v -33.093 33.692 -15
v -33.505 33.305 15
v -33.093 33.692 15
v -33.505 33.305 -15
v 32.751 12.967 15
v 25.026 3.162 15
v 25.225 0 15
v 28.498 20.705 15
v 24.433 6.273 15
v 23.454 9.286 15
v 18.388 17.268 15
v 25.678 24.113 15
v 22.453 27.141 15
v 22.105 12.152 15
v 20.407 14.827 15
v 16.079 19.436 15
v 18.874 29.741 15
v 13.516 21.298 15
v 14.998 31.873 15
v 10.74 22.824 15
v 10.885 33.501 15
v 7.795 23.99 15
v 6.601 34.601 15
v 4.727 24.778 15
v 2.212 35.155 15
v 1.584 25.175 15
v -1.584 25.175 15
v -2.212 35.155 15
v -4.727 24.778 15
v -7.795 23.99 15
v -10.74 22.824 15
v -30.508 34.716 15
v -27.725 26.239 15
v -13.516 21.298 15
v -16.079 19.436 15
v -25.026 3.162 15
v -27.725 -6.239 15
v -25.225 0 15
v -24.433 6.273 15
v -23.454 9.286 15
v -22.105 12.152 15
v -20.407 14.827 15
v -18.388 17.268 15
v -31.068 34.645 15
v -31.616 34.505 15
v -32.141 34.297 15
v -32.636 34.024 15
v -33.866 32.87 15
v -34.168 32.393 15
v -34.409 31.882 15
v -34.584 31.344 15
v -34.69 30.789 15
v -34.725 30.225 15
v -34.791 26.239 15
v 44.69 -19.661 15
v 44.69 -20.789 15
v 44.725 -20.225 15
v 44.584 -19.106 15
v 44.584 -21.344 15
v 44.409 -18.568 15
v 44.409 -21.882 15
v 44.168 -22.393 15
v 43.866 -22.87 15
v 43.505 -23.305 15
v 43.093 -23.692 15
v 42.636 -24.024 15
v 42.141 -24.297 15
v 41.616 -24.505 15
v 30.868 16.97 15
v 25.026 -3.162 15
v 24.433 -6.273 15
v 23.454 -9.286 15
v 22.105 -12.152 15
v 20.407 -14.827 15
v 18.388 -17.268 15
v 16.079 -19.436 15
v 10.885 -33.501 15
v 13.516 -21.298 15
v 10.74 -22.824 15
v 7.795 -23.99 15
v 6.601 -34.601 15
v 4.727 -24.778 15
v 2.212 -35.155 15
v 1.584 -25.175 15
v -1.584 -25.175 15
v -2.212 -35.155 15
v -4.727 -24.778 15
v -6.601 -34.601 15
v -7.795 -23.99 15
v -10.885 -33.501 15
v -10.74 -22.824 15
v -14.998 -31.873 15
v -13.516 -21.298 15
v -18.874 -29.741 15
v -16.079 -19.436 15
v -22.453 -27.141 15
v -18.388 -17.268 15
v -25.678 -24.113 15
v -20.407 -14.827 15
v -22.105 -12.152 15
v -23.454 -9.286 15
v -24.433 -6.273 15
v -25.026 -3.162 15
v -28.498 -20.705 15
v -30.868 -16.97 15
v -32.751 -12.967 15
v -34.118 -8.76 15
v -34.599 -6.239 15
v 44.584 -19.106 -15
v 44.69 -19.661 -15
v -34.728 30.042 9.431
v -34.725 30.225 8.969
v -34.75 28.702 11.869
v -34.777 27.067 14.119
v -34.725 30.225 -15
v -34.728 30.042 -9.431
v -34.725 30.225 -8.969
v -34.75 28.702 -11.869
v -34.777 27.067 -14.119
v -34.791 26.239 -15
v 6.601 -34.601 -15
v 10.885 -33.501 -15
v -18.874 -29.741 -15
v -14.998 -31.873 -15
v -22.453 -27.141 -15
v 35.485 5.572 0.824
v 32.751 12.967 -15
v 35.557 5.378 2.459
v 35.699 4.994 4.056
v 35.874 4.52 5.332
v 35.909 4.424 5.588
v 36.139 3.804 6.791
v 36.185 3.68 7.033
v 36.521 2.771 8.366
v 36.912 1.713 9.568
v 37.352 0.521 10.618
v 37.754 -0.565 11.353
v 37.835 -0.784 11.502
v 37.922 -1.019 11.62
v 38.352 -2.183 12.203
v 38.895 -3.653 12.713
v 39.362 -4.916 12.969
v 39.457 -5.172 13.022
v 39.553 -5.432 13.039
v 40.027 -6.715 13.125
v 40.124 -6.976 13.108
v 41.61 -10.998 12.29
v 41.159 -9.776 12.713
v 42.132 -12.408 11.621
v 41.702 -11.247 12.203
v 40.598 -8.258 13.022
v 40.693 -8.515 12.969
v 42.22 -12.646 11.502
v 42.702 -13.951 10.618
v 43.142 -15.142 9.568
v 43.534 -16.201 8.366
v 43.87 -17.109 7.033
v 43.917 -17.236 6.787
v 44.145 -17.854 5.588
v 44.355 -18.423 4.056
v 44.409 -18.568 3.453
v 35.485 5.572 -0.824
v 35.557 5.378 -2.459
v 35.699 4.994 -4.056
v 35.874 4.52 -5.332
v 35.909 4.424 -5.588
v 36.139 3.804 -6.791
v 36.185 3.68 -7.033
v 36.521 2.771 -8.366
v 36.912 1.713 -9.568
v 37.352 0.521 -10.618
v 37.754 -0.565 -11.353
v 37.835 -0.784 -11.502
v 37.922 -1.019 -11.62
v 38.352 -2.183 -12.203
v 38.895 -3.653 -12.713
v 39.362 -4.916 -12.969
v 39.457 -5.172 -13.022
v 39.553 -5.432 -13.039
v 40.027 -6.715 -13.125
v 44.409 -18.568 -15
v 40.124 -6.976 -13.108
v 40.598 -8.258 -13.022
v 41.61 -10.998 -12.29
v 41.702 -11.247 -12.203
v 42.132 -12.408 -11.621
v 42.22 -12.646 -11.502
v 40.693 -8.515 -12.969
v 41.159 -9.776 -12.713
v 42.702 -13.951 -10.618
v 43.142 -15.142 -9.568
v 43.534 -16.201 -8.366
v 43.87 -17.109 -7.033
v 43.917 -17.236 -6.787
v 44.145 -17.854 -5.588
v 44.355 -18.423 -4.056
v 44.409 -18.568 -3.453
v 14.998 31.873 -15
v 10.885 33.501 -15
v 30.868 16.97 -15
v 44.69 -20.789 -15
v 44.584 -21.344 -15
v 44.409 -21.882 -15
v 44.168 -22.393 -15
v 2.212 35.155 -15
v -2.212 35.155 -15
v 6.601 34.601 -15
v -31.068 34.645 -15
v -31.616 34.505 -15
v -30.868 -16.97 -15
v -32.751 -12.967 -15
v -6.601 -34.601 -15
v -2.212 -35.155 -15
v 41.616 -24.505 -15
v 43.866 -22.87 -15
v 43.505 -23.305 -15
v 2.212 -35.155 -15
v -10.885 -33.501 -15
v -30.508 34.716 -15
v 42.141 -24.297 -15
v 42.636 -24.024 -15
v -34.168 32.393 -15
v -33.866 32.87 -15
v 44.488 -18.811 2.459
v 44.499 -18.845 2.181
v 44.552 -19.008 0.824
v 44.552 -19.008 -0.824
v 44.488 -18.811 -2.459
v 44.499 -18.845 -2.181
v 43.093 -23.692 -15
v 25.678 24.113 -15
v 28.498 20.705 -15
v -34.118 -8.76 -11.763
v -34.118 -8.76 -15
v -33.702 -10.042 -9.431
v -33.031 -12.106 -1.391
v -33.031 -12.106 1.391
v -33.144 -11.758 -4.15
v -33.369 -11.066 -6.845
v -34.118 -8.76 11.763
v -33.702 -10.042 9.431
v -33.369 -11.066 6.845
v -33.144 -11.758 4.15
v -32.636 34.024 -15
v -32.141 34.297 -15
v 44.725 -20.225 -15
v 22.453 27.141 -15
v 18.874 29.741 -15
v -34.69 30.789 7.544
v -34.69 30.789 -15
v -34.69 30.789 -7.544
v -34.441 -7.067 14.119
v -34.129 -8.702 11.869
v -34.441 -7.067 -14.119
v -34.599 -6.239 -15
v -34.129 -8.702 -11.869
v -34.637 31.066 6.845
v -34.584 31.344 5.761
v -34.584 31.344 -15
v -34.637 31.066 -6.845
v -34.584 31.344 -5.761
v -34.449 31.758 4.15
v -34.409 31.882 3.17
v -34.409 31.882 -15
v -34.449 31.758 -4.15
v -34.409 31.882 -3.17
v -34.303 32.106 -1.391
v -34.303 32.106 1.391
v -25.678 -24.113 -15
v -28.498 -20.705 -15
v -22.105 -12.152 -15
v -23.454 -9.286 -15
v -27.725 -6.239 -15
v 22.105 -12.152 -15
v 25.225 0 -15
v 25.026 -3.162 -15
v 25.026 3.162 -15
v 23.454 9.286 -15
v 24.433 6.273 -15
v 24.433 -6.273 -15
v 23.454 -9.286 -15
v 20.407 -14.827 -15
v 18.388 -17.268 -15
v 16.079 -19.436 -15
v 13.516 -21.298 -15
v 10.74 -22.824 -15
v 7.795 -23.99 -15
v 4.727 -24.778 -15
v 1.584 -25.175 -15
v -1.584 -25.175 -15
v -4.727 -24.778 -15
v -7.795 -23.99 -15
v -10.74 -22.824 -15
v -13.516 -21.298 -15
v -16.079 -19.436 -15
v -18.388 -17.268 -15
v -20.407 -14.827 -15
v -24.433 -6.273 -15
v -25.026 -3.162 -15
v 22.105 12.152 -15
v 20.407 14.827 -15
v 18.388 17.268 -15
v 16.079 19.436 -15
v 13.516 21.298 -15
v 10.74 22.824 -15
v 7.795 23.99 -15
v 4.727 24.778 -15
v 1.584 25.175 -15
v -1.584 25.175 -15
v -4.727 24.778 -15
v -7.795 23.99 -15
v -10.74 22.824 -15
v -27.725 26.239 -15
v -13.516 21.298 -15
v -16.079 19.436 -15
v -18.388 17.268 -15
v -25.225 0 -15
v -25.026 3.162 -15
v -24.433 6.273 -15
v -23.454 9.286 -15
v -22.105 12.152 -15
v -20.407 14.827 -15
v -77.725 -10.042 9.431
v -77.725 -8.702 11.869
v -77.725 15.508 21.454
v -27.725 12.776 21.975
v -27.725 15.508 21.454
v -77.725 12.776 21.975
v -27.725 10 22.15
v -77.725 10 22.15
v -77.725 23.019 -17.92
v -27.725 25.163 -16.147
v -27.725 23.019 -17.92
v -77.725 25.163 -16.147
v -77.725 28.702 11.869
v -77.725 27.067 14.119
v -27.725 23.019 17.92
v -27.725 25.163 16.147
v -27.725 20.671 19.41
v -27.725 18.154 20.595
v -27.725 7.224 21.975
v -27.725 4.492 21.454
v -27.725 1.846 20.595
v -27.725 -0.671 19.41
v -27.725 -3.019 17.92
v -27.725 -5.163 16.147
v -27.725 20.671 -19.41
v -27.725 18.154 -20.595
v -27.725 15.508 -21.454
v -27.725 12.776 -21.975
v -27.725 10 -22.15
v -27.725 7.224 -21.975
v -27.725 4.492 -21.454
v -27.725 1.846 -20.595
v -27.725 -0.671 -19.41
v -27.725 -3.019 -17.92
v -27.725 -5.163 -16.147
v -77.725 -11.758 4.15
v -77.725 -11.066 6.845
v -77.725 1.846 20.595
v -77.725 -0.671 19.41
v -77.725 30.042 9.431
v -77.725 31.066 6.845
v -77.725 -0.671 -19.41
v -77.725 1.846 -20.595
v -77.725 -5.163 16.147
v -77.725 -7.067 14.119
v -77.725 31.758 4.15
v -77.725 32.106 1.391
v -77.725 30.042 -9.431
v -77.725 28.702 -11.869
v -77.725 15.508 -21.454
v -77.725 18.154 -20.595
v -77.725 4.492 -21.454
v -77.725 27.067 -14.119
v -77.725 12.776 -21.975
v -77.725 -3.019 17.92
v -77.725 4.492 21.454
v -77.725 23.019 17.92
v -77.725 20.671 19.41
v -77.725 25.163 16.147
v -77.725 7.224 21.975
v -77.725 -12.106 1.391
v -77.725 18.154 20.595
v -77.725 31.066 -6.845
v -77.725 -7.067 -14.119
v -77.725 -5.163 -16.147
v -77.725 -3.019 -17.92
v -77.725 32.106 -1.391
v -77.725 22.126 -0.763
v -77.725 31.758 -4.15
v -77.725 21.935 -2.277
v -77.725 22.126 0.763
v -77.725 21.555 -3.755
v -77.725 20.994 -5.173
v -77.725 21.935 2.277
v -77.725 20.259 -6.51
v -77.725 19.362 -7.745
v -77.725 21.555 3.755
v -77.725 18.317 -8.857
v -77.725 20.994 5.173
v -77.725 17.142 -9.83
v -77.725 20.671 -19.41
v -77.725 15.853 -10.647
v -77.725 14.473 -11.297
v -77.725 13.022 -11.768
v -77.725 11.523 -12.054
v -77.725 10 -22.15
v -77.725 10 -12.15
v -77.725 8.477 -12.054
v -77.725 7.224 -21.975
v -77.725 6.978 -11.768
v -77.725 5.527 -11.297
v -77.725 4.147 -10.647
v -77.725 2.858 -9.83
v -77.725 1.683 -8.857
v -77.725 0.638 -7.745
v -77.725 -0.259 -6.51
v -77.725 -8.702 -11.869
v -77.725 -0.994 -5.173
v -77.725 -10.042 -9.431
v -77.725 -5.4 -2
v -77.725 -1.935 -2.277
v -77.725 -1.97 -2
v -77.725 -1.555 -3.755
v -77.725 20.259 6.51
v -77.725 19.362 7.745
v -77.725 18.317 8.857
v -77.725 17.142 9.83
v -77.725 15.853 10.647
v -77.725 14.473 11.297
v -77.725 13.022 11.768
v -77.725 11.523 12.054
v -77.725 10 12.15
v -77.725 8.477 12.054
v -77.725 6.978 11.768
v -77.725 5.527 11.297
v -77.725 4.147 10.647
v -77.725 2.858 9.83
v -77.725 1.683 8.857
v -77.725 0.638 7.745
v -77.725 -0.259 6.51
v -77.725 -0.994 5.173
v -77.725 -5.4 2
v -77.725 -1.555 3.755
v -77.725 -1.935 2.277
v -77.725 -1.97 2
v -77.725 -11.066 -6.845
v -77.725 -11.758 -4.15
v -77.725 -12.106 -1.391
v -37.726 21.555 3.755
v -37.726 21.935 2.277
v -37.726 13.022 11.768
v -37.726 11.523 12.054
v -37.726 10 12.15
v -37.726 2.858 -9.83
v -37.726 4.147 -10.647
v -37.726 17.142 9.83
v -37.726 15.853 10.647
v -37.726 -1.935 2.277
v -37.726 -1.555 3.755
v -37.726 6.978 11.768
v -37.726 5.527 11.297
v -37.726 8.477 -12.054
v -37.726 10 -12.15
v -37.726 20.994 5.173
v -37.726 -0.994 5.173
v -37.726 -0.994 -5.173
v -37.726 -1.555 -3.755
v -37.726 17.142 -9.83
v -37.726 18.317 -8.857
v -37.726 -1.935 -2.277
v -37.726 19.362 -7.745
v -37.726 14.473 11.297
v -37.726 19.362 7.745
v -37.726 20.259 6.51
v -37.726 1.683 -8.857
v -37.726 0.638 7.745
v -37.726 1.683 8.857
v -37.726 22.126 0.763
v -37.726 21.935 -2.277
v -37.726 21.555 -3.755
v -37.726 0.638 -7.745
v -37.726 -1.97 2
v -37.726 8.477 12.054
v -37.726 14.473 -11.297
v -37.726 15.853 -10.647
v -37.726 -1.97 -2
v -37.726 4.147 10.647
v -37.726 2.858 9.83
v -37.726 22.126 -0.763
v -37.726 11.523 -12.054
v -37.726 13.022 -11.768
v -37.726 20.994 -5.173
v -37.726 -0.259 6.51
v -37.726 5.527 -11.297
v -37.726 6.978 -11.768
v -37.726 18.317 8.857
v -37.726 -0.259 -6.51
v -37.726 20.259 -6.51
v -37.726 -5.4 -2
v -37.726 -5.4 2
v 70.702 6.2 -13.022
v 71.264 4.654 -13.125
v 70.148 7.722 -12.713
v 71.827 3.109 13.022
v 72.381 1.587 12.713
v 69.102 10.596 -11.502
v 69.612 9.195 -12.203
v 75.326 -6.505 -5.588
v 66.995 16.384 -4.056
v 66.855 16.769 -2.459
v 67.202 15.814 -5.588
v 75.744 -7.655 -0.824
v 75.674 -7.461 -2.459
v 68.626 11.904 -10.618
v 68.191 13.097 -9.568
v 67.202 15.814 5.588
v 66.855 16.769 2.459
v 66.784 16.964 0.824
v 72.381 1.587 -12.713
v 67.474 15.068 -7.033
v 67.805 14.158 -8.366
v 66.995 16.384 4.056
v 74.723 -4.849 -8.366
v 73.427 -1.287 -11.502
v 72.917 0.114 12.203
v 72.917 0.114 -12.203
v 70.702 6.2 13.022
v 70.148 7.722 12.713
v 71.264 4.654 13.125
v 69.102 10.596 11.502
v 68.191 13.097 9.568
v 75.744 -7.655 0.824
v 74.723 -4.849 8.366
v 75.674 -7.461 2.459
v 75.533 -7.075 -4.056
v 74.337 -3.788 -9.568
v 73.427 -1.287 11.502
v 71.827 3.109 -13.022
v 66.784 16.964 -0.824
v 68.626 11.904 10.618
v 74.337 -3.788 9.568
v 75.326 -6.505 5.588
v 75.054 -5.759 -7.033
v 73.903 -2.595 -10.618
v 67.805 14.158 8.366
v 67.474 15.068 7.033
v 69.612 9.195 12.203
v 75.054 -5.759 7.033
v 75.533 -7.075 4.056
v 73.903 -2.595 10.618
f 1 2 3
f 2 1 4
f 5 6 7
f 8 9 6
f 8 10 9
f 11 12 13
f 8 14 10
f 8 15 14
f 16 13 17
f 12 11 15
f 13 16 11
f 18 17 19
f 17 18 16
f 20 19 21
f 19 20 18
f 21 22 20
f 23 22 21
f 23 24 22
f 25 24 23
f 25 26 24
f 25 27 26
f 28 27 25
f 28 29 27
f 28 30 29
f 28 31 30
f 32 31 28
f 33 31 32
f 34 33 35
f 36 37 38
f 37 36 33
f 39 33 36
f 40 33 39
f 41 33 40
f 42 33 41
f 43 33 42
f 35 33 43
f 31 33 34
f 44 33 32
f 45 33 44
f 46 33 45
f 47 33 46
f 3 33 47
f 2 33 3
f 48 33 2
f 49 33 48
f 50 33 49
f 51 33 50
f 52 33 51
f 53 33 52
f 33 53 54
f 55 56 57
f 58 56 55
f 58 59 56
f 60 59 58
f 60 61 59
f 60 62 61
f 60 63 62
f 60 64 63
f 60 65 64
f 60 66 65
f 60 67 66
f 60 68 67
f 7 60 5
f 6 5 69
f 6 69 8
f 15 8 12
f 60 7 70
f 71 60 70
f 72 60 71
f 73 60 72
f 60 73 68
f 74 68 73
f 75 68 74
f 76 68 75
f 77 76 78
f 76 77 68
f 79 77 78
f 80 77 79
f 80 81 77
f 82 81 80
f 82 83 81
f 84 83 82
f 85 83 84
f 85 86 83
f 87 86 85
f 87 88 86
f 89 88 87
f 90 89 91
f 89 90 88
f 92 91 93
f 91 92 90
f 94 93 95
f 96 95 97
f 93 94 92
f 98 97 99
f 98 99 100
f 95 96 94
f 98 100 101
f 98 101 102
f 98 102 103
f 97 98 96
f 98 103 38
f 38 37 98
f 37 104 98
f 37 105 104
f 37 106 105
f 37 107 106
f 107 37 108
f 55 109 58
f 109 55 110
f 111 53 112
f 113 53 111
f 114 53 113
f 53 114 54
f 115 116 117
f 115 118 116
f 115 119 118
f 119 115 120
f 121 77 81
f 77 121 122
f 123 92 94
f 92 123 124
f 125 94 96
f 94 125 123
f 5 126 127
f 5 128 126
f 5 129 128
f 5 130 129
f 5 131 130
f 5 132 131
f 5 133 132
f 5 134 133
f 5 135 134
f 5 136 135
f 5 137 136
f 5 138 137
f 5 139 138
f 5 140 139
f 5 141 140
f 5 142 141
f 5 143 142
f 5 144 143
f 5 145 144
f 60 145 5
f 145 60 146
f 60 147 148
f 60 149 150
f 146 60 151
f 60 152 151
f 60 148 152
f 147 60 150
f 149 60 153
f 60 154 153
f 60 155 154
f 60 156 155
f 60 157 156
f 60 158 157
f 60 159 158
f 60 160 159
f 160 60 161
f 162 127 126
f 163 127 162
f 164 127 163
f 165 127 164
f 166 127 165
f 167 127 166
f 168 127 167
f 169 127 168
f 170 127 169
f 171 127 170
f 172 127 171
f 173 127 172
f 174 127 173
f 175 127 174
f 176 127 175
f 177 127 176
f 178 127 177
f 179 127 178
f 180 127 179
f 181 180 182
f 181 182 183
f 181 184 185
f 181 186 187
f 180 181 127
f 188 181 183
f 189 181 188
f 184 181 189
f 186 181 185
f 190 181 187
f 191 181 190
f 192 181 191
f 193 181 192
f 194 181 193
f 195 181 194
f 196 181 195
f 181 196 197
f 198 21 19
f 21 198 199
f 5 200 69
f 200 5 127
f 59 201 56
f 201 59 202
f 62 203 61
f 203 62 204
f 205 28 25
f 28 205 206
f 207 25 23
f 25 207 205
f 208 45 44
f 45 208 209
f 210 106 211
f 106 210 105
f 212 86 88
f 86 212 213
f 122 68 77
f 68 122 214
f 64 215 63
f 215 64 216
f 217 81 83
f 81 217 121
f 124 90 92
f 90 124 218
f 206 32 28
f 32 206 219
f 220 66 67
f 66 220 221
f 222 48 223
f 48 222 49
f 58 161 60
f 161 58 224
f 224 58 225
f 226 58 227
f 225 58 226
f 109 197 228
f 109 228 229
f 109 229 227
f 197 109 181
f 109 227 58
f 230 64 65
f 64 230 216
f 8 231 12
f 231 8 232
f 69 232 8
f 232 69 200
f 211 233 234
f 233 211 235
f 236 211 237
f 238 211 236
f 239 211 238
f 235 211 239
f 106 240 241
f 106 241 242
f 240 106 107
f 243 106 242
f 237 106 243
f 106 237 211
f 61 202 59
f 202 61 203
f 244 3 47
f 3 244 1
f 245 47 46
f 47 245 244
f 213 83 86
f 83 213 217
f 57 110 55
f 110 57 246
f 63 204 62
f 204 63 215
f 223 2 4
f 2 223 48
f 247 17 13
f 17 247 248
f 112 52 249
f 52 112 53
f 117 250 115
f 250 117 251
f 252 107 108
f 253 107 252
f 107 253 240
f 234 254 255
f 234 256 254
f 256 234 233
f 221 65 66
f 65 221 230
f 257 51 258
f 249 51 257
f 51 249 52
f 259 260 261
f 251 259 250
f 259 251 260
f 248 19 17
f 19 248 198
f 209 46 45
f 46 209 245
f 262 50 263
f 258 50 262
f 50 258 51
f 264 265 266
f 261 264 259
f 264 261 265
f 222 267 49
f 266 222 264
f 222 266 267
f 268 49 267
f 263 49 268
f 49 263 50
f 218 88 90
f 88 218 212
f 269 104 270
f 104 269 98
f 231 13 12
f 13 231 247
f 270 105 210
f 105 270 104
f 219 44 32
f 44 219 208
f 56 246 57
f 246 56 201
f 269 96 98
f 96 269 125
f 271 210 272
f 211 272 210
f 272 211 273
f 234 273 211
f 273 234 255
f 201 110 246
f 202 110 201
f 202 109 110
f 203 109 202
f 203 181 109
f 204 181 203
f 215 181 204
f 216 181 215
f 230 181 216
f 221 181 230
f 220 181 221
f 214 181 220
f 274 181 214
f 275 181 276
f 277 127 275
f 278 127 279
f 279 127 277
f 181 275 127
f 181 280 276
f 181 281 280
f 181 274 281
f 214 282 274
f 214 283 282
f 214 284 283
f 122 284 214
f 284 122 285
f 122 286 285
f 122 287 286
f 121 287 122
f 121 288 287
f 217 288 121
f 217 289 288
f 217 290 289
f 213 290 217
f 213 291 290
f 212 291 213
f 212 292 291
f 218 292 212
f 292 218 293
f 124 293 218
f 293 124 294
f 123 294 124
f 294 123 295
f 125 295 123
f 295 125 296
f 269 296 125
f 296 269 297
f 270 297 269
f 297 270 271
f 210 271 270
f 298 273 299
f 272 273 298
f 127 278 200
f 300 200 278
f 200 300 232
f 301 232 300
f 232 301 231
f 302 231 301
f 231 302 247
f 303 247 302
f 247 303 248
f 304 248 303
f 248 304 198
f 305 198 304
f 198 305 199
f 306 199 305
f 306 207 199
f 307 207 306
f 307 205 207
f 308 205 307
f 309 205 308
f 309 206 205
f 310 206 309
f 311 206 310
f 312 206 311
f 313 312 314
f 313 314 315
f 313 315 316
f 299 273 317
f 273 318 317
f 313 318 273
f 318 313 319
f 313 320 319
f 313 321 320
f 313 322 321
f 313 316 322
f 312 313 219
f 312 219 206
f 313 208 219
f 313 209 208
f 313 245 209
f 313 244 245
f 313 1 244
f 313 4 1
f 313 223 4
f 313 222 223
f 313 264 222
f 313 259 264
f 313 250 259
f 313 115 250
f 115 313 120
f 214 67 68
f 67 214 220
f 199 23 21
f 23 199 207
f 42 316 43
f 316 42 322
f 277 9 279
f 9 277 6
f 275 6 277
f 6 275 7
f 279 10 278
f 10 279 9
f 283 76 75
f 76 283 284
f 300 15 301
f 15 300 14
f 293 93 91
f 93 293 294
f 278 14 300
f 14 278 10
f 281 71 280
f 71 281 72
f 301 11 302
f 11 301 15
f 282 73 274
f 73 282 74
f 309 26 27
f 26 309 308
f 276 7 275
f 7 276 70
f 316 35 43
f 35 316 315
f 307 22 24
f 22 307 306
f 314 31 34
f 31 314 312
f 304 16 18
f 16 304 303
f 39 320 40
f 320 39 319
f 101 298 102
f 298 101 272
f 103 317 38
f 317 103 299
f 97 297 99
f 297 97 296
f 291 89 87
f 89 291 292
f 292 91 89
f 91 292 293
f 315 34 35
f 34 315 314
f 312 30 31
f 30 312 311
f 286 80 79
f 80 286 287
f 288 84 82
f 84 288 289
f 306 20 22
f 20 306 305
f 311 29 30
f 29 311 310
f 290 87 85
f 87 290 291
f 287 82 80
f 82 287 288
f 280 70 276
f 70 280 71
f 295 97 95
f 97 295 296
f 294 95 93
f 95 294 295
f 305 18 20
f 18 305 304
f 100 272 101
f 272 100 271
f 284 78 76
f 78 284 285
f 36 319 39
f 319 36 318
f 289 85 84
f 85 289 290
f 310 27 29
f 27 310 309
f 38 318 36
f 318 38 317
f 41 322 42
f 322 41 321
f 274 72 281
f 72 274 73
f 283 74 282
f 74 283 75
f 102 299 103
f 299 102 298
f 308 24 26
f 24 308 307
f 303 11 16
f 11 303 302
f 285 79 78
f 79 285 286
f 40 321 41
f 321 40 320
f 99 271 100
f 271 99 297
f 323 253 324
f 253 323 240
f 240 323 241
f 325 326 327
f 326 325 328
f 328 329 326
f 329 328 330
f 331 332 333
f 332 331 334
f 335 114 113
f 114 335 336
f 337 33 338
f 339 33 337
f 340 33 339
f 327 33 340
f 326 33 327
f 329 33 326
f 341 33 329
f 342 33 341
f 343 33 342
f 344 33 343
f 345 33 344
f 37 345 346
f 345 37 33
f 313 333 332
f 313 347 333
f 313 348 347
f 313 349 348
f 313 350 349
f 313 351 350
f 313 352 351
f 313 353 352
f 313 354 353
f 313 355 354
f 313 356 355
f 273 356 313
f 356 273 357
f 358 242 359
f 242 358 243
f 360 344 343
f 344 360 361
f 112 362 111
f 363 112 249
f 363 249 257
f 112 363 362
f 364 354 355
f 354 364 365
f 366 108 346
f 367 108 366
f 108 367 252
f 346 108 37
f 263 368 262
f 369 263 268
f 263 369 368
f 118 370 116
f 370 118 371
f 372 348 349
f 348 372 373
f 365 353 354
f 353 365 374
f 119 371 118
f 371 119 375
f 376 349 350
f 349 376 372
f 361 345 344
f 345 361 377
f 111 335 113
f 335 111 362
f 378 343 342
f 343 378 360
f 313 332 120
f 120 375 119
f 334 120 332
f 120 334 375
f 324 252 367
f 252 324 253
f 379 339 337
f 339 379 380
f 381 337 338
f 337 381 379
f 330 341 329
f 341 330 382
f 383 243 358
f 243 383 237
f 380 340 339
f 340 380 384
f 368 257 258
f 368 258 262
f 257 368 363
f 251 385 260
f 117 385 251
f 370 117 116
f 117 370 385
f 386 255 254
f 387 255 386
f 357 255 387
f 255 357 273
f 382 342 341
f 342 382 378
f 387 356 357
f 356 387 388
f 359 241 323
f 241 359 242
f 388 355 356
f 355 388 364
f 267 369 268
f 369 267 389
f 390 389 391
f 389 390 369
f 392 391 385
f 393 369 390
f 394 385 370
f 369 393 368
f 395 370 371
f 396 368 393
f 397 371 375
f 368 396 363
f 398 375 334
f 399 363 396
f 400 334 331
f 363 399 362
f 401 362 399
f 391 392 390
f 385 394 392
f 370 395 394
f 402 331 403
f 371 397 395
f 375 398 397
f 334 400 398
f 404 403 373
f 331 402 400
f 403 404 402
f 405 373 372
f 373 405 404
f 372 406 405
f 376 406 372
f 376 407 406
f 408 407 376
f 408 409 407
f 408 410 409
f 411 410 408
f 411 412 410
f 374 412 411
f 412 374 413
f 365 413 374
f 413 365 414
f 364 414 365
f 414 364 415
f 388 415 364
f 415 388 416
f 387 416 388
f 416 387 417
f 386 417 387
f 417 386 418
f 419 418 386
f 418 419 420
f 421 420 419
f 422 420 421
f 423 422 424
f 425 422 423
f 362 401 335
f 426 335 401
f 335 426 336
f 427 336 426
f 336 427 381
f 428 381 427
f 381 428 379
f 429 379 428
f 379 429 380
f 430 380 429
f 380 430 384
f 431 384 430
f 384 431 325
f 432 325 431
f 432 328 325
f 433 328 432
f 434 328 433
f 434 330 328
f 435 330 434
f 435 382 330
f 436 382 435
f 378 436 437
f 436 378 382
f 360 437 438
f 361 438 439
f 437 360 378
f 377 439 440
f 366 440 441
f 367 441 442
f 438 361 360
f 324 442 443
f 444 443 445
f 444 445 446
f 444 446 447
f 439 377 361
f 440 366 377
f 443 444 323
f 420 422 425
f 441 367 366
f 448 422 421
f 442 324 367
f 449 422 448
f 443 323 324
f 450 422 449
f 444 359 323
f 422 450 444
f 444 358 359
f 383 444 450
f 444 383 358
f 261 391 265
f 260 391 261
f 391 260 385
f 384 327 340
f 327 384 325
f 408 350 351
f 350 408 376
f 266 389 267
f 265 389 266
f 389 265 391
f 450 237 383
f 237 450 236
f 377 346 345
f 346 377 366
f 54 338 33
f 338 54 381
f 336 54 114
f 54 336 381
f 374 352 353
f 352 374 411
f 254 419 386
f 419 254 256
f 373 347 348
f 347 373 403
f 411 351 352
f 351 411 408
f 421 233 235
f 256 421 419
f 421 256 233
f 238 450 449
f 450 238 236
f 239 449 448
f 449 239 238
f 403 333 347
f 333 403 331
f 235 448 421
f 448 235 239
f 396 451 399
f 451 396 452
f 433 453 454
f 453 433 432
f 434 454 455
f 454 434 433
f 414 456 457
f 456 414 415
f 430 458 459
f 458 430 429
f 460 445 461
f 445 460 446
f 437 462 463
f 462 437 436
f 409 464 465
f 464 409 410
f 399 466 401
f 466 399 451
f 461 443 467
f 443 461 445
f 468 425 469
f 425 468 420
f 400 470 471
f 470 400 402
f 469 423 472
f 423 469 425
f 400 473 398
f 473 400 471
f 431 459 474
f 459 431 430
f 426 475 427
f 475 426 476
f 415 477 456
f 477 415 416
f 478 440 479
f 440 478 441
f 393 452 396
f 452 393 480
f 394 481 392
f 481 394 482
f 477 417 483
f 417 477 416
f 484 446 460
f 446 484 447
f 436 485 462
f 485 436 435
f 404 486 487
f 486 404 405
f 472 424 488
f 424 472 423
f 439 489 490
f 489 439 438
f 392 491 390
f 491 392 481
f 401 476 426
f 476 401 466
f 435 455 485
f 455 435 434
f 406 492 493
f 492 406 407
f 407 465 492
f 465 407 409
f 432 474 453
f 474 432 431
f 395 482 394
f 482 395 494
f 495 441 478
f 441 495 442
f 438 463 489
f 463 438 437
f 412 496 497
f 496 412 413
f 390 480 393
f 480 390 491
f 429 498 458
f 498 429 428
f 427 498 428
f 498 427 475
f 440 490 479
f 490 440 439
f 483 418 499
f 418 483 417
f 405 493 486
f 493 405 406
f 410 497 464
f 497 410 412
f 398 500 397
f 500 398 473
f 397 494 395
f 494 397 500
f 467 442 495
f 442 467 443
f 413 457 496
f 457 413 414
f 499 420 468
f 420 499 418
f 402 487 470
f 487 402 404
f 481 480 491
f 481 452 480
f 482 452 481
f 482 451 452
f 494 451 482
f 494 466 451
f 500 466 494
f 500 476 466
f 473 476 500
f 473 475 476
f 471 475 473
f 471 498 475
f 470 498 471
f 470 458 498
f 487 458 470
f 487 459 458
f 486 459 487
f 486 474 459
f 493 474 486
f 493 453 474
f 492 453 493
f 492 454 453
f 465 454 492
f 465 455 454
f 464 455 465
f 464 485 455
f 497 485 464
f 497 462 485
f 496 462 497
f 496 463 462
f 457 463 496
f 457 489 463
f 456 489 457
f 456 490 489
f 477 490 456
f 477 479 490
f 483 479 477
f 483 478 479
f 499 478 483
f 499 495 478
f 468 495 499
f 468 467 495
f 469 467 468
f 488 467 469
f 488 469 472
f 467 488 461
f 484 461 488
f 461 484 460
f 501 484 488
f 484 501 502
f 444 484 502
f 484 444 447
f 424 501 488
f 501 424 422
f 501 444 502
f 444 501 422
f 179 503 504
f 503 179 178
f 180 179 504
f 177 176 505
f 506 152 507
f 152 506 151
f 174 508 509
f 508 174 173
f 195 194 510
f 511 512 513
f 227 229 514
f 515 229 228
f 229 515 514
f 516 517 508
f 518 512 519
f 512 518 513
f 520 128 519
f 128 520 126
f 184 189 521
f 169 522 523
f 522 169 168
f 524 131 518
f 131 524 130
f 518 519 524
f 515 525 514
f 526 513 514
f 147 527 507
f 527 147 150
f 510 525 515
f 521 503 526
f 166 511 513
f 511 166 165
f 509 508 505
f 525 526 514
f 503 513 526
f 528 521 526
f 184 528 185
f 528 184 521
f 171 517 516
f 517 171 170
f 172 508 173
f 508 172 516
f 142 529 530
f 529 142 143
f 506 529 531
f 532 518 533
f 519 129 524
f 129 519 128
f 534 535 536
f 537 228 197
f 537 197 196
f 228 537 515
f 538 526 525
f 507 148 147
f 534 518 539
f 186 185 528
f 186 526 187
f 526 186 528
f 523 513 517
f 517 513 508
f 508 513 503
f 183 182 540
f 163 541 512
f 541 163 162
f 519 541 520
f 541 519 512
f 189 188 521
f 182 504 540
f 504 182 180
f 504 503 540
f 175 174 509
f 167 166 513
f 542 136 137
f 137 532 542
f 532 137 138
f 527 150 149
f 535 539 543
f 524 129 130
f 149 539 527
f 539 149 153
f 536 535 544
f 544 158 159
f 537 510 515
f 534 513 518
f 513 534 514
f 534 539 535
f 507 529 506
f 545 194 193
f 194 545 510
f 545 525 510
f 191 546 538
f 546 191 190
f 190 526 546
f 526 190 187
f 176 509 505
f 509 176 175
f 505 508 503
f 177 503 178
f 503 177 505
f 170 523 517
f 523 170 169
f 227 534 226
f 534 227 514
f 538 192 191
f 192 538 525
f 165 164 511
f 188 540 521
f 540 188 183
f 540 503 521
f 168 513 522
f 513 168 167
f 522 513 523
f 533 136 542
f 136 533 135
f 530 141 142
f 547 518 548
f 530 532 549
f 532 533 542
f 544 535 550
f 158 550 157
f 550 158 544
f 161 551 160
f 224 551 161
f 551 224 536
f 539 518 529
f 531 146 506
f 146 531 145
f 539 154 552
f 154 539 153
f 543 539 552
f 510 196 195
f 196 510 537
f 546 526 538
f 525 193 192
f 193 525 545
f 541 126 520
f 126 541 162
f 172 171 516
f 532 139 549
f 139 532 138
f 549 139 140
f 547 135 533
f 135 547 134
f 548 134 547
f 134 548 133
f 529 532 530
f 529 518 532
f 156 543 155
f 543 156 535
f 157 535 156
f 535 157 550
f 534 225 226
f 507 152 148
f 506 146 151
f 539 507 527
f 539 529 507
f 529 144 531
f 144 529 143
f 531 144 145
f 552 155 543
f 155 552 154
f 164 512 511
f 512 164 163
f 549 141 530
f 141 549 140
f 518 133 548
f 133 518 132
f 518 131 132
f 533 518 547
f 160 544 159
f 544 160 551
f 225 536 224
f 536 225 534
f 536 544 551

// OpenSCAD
pvc100PipeInnerDia=26.25;  // 1 inch
pvc100PipeOuterDia=33.5; // 1.32 inches

pvc125PipeInnerDia=31.75;  // 1.25 inches
pvc125PipeOuterDia=42.25; // 1.665 inches
pvc125FittingInnerDia=pvc125PipeOuterDia;
pvc125FittingOuterDia=50.45;  // 1.985 inches
pvc125FittingInsertionDepth=32; // ~1.25 inches

bracketWidth=30;
bracketCasingThickness=10;

bodyExtensionRoundoffDia=9;
rearPvcInsertPostExtensionXOffset=5;
rearPvcInsertPostExtensionYOffset=-5;
frontInsertionReceiverExtensionXOffset=-5;
frontInsertionReceiverExtensionYOffset=5;

hobieChairLegInsertDia=24.3;
hobieChairLegInsertDepth=40;
hobieChairLegInsertOffset=10;

// height of "blade" that fits into the alignment key slot on one side
hobieChairLegKeyRidgeHeight=3.25;
hobieChairLegKeyRidgeHeightCurvatureOverlap=0.5;
hobieChairLegKeyRidgeWidth=4;

rearPvcInsertLength=40;
rearPvcInsertOffset=20;
rearPvcInsertAngle=20;


overlap=0.001;
$fn=50;

union() {
    translate([0,0,-bracketWidth/2]) 
        pvcPassThruBody();
    translate([-pvc125FittingOuterDia/2-bracketCasingThickness/4,hobieChairLegInsertOffset,0])
        rotate([0,-90,0])
            frontInsertionReceiver();
    rotate([0,0,rearPvcInsertAngle])
        translate([pvc125FittingOuterDia/2+bracketCasingThickness/3,-rearPvcInsertOffset,0])
            rotate([0,90,0])
                rearPvcInsertPost();
}

module rearPvcInsertPost() {
    cylinder(d=pvc100PipeInnerDia, h=rearPvcInsertLength);
}


module frontInsertionReceiver() {
    difference() {
        cylinder(d=hobieChairLegInsertDia+bracketCasingThickness*2,h=hobieChairLegInsertDepth+bracketCasingThickness);
        translate([0,0,bracketCasingThickness+overlap])
            cylinder(d=hobieChairLegInsertDia,h=hobieChairLegInsertDepth+overlap);
        translate([-hobieChairLegKeyRidgeWidth/2,
                -hobieChairLegInsertDia/2-hobieChairLegKeyRidgeHeight,
                bracketCasingThickness+overlap])
            cube([hobieChairLegKeyRidgeWidth,
                hobieChairLegKeyRidgeHeight+hobieChairLegKeyRidgeHeightCurvatureOverlap,
                hobieChairLegInsertDepth+overlap]);
    }
}

module pvcPassThruBody() {
    difference() {
        hull() {
            cylinder(d=pvc125FittingOuterDia+2*bracketCasingThickness, h=bracketWidth);
            // Extension to make a base for the hobie chair receiver
            translate([-pvc125FittingOuterDia/2-bracketCasingThickness-frontInsertionReceiverExtensionXOffset,
                    pvc125FittingOuterDia/2+frontInsertionReceiverExtensionYOffset,0])
                cylinder(d=bodyExtensionRoundoffDia, h=bracketWidth);
            // Extension to make a base for the pvc insert post
            translate([pvc125FittingOuterDia/2+bracketCasingThickness+rearPvcInsertPostExtensionXOffset,
                    -pvc125FittingOuterDia/2-rearPvcInsertPostExtensionYOffset,0])
                cylinder(d=bodyExtensionRoundoffDia, h=bracketWidth);
        }
        translate([0,0,-overlap])
            cylinder(d=pvc125FittingOuterDia, h=bracketWidth+overlap*2);
    }
}
    

//pvcElbow45(pvc125FittingInnerDia, pvc125FittingOuterDia, pvc125FittingInsertionDepth);

module pvcElbow45(pvcElbow45InnerDia, pvcElbow45OuterDia, pvcElbow45InsertionDepth) {
    pvcElbow45OuterBendExtraLength=pvcElbow45OuterDia;
    union() {
        pvcElbow45Half(pvcElbow45InnerDia, pvcElbow45OuterDia, 
            pvcElbow45InsertionDepth, pvcElbow45OuterBendExtraLength);
        mirror([0,0,1])
            pvcElbow45Half(pvcElbow45InnerDia, pvcElbow45OuterDia, 
                pvcElbow45InsertionDepth, pvcElbow45OuterBendExtraLength);
    }
}

module pvcElbow45Half(pvcElbow45InnerDia, pvcElbow45OuterDia, pvcElbow45InsertionDepth, pvcElbow45OuterBendExtraLength) {
    translate([0,0,-pvcElbow45InsertionDepth-pvcElbow45OuterBendExtraLength/4])
    difference() {
        %cylinder(d=pvcElbow45OuterDia, h=pvcElbow45InsertionDepth+pvcElbow45OuterBendExtraLength);
        %translate([-pvcElbow45OuterDia,pvcElbow45OuterDia/2,pvcElbow45InsertionDepth])
            rotate([45+45/2,0,0])
                cube([pvcElbow45OuterDia*2,pvcElbow45OuterDia*2,pvcElbow45OuterDia*2]);
    }
}
